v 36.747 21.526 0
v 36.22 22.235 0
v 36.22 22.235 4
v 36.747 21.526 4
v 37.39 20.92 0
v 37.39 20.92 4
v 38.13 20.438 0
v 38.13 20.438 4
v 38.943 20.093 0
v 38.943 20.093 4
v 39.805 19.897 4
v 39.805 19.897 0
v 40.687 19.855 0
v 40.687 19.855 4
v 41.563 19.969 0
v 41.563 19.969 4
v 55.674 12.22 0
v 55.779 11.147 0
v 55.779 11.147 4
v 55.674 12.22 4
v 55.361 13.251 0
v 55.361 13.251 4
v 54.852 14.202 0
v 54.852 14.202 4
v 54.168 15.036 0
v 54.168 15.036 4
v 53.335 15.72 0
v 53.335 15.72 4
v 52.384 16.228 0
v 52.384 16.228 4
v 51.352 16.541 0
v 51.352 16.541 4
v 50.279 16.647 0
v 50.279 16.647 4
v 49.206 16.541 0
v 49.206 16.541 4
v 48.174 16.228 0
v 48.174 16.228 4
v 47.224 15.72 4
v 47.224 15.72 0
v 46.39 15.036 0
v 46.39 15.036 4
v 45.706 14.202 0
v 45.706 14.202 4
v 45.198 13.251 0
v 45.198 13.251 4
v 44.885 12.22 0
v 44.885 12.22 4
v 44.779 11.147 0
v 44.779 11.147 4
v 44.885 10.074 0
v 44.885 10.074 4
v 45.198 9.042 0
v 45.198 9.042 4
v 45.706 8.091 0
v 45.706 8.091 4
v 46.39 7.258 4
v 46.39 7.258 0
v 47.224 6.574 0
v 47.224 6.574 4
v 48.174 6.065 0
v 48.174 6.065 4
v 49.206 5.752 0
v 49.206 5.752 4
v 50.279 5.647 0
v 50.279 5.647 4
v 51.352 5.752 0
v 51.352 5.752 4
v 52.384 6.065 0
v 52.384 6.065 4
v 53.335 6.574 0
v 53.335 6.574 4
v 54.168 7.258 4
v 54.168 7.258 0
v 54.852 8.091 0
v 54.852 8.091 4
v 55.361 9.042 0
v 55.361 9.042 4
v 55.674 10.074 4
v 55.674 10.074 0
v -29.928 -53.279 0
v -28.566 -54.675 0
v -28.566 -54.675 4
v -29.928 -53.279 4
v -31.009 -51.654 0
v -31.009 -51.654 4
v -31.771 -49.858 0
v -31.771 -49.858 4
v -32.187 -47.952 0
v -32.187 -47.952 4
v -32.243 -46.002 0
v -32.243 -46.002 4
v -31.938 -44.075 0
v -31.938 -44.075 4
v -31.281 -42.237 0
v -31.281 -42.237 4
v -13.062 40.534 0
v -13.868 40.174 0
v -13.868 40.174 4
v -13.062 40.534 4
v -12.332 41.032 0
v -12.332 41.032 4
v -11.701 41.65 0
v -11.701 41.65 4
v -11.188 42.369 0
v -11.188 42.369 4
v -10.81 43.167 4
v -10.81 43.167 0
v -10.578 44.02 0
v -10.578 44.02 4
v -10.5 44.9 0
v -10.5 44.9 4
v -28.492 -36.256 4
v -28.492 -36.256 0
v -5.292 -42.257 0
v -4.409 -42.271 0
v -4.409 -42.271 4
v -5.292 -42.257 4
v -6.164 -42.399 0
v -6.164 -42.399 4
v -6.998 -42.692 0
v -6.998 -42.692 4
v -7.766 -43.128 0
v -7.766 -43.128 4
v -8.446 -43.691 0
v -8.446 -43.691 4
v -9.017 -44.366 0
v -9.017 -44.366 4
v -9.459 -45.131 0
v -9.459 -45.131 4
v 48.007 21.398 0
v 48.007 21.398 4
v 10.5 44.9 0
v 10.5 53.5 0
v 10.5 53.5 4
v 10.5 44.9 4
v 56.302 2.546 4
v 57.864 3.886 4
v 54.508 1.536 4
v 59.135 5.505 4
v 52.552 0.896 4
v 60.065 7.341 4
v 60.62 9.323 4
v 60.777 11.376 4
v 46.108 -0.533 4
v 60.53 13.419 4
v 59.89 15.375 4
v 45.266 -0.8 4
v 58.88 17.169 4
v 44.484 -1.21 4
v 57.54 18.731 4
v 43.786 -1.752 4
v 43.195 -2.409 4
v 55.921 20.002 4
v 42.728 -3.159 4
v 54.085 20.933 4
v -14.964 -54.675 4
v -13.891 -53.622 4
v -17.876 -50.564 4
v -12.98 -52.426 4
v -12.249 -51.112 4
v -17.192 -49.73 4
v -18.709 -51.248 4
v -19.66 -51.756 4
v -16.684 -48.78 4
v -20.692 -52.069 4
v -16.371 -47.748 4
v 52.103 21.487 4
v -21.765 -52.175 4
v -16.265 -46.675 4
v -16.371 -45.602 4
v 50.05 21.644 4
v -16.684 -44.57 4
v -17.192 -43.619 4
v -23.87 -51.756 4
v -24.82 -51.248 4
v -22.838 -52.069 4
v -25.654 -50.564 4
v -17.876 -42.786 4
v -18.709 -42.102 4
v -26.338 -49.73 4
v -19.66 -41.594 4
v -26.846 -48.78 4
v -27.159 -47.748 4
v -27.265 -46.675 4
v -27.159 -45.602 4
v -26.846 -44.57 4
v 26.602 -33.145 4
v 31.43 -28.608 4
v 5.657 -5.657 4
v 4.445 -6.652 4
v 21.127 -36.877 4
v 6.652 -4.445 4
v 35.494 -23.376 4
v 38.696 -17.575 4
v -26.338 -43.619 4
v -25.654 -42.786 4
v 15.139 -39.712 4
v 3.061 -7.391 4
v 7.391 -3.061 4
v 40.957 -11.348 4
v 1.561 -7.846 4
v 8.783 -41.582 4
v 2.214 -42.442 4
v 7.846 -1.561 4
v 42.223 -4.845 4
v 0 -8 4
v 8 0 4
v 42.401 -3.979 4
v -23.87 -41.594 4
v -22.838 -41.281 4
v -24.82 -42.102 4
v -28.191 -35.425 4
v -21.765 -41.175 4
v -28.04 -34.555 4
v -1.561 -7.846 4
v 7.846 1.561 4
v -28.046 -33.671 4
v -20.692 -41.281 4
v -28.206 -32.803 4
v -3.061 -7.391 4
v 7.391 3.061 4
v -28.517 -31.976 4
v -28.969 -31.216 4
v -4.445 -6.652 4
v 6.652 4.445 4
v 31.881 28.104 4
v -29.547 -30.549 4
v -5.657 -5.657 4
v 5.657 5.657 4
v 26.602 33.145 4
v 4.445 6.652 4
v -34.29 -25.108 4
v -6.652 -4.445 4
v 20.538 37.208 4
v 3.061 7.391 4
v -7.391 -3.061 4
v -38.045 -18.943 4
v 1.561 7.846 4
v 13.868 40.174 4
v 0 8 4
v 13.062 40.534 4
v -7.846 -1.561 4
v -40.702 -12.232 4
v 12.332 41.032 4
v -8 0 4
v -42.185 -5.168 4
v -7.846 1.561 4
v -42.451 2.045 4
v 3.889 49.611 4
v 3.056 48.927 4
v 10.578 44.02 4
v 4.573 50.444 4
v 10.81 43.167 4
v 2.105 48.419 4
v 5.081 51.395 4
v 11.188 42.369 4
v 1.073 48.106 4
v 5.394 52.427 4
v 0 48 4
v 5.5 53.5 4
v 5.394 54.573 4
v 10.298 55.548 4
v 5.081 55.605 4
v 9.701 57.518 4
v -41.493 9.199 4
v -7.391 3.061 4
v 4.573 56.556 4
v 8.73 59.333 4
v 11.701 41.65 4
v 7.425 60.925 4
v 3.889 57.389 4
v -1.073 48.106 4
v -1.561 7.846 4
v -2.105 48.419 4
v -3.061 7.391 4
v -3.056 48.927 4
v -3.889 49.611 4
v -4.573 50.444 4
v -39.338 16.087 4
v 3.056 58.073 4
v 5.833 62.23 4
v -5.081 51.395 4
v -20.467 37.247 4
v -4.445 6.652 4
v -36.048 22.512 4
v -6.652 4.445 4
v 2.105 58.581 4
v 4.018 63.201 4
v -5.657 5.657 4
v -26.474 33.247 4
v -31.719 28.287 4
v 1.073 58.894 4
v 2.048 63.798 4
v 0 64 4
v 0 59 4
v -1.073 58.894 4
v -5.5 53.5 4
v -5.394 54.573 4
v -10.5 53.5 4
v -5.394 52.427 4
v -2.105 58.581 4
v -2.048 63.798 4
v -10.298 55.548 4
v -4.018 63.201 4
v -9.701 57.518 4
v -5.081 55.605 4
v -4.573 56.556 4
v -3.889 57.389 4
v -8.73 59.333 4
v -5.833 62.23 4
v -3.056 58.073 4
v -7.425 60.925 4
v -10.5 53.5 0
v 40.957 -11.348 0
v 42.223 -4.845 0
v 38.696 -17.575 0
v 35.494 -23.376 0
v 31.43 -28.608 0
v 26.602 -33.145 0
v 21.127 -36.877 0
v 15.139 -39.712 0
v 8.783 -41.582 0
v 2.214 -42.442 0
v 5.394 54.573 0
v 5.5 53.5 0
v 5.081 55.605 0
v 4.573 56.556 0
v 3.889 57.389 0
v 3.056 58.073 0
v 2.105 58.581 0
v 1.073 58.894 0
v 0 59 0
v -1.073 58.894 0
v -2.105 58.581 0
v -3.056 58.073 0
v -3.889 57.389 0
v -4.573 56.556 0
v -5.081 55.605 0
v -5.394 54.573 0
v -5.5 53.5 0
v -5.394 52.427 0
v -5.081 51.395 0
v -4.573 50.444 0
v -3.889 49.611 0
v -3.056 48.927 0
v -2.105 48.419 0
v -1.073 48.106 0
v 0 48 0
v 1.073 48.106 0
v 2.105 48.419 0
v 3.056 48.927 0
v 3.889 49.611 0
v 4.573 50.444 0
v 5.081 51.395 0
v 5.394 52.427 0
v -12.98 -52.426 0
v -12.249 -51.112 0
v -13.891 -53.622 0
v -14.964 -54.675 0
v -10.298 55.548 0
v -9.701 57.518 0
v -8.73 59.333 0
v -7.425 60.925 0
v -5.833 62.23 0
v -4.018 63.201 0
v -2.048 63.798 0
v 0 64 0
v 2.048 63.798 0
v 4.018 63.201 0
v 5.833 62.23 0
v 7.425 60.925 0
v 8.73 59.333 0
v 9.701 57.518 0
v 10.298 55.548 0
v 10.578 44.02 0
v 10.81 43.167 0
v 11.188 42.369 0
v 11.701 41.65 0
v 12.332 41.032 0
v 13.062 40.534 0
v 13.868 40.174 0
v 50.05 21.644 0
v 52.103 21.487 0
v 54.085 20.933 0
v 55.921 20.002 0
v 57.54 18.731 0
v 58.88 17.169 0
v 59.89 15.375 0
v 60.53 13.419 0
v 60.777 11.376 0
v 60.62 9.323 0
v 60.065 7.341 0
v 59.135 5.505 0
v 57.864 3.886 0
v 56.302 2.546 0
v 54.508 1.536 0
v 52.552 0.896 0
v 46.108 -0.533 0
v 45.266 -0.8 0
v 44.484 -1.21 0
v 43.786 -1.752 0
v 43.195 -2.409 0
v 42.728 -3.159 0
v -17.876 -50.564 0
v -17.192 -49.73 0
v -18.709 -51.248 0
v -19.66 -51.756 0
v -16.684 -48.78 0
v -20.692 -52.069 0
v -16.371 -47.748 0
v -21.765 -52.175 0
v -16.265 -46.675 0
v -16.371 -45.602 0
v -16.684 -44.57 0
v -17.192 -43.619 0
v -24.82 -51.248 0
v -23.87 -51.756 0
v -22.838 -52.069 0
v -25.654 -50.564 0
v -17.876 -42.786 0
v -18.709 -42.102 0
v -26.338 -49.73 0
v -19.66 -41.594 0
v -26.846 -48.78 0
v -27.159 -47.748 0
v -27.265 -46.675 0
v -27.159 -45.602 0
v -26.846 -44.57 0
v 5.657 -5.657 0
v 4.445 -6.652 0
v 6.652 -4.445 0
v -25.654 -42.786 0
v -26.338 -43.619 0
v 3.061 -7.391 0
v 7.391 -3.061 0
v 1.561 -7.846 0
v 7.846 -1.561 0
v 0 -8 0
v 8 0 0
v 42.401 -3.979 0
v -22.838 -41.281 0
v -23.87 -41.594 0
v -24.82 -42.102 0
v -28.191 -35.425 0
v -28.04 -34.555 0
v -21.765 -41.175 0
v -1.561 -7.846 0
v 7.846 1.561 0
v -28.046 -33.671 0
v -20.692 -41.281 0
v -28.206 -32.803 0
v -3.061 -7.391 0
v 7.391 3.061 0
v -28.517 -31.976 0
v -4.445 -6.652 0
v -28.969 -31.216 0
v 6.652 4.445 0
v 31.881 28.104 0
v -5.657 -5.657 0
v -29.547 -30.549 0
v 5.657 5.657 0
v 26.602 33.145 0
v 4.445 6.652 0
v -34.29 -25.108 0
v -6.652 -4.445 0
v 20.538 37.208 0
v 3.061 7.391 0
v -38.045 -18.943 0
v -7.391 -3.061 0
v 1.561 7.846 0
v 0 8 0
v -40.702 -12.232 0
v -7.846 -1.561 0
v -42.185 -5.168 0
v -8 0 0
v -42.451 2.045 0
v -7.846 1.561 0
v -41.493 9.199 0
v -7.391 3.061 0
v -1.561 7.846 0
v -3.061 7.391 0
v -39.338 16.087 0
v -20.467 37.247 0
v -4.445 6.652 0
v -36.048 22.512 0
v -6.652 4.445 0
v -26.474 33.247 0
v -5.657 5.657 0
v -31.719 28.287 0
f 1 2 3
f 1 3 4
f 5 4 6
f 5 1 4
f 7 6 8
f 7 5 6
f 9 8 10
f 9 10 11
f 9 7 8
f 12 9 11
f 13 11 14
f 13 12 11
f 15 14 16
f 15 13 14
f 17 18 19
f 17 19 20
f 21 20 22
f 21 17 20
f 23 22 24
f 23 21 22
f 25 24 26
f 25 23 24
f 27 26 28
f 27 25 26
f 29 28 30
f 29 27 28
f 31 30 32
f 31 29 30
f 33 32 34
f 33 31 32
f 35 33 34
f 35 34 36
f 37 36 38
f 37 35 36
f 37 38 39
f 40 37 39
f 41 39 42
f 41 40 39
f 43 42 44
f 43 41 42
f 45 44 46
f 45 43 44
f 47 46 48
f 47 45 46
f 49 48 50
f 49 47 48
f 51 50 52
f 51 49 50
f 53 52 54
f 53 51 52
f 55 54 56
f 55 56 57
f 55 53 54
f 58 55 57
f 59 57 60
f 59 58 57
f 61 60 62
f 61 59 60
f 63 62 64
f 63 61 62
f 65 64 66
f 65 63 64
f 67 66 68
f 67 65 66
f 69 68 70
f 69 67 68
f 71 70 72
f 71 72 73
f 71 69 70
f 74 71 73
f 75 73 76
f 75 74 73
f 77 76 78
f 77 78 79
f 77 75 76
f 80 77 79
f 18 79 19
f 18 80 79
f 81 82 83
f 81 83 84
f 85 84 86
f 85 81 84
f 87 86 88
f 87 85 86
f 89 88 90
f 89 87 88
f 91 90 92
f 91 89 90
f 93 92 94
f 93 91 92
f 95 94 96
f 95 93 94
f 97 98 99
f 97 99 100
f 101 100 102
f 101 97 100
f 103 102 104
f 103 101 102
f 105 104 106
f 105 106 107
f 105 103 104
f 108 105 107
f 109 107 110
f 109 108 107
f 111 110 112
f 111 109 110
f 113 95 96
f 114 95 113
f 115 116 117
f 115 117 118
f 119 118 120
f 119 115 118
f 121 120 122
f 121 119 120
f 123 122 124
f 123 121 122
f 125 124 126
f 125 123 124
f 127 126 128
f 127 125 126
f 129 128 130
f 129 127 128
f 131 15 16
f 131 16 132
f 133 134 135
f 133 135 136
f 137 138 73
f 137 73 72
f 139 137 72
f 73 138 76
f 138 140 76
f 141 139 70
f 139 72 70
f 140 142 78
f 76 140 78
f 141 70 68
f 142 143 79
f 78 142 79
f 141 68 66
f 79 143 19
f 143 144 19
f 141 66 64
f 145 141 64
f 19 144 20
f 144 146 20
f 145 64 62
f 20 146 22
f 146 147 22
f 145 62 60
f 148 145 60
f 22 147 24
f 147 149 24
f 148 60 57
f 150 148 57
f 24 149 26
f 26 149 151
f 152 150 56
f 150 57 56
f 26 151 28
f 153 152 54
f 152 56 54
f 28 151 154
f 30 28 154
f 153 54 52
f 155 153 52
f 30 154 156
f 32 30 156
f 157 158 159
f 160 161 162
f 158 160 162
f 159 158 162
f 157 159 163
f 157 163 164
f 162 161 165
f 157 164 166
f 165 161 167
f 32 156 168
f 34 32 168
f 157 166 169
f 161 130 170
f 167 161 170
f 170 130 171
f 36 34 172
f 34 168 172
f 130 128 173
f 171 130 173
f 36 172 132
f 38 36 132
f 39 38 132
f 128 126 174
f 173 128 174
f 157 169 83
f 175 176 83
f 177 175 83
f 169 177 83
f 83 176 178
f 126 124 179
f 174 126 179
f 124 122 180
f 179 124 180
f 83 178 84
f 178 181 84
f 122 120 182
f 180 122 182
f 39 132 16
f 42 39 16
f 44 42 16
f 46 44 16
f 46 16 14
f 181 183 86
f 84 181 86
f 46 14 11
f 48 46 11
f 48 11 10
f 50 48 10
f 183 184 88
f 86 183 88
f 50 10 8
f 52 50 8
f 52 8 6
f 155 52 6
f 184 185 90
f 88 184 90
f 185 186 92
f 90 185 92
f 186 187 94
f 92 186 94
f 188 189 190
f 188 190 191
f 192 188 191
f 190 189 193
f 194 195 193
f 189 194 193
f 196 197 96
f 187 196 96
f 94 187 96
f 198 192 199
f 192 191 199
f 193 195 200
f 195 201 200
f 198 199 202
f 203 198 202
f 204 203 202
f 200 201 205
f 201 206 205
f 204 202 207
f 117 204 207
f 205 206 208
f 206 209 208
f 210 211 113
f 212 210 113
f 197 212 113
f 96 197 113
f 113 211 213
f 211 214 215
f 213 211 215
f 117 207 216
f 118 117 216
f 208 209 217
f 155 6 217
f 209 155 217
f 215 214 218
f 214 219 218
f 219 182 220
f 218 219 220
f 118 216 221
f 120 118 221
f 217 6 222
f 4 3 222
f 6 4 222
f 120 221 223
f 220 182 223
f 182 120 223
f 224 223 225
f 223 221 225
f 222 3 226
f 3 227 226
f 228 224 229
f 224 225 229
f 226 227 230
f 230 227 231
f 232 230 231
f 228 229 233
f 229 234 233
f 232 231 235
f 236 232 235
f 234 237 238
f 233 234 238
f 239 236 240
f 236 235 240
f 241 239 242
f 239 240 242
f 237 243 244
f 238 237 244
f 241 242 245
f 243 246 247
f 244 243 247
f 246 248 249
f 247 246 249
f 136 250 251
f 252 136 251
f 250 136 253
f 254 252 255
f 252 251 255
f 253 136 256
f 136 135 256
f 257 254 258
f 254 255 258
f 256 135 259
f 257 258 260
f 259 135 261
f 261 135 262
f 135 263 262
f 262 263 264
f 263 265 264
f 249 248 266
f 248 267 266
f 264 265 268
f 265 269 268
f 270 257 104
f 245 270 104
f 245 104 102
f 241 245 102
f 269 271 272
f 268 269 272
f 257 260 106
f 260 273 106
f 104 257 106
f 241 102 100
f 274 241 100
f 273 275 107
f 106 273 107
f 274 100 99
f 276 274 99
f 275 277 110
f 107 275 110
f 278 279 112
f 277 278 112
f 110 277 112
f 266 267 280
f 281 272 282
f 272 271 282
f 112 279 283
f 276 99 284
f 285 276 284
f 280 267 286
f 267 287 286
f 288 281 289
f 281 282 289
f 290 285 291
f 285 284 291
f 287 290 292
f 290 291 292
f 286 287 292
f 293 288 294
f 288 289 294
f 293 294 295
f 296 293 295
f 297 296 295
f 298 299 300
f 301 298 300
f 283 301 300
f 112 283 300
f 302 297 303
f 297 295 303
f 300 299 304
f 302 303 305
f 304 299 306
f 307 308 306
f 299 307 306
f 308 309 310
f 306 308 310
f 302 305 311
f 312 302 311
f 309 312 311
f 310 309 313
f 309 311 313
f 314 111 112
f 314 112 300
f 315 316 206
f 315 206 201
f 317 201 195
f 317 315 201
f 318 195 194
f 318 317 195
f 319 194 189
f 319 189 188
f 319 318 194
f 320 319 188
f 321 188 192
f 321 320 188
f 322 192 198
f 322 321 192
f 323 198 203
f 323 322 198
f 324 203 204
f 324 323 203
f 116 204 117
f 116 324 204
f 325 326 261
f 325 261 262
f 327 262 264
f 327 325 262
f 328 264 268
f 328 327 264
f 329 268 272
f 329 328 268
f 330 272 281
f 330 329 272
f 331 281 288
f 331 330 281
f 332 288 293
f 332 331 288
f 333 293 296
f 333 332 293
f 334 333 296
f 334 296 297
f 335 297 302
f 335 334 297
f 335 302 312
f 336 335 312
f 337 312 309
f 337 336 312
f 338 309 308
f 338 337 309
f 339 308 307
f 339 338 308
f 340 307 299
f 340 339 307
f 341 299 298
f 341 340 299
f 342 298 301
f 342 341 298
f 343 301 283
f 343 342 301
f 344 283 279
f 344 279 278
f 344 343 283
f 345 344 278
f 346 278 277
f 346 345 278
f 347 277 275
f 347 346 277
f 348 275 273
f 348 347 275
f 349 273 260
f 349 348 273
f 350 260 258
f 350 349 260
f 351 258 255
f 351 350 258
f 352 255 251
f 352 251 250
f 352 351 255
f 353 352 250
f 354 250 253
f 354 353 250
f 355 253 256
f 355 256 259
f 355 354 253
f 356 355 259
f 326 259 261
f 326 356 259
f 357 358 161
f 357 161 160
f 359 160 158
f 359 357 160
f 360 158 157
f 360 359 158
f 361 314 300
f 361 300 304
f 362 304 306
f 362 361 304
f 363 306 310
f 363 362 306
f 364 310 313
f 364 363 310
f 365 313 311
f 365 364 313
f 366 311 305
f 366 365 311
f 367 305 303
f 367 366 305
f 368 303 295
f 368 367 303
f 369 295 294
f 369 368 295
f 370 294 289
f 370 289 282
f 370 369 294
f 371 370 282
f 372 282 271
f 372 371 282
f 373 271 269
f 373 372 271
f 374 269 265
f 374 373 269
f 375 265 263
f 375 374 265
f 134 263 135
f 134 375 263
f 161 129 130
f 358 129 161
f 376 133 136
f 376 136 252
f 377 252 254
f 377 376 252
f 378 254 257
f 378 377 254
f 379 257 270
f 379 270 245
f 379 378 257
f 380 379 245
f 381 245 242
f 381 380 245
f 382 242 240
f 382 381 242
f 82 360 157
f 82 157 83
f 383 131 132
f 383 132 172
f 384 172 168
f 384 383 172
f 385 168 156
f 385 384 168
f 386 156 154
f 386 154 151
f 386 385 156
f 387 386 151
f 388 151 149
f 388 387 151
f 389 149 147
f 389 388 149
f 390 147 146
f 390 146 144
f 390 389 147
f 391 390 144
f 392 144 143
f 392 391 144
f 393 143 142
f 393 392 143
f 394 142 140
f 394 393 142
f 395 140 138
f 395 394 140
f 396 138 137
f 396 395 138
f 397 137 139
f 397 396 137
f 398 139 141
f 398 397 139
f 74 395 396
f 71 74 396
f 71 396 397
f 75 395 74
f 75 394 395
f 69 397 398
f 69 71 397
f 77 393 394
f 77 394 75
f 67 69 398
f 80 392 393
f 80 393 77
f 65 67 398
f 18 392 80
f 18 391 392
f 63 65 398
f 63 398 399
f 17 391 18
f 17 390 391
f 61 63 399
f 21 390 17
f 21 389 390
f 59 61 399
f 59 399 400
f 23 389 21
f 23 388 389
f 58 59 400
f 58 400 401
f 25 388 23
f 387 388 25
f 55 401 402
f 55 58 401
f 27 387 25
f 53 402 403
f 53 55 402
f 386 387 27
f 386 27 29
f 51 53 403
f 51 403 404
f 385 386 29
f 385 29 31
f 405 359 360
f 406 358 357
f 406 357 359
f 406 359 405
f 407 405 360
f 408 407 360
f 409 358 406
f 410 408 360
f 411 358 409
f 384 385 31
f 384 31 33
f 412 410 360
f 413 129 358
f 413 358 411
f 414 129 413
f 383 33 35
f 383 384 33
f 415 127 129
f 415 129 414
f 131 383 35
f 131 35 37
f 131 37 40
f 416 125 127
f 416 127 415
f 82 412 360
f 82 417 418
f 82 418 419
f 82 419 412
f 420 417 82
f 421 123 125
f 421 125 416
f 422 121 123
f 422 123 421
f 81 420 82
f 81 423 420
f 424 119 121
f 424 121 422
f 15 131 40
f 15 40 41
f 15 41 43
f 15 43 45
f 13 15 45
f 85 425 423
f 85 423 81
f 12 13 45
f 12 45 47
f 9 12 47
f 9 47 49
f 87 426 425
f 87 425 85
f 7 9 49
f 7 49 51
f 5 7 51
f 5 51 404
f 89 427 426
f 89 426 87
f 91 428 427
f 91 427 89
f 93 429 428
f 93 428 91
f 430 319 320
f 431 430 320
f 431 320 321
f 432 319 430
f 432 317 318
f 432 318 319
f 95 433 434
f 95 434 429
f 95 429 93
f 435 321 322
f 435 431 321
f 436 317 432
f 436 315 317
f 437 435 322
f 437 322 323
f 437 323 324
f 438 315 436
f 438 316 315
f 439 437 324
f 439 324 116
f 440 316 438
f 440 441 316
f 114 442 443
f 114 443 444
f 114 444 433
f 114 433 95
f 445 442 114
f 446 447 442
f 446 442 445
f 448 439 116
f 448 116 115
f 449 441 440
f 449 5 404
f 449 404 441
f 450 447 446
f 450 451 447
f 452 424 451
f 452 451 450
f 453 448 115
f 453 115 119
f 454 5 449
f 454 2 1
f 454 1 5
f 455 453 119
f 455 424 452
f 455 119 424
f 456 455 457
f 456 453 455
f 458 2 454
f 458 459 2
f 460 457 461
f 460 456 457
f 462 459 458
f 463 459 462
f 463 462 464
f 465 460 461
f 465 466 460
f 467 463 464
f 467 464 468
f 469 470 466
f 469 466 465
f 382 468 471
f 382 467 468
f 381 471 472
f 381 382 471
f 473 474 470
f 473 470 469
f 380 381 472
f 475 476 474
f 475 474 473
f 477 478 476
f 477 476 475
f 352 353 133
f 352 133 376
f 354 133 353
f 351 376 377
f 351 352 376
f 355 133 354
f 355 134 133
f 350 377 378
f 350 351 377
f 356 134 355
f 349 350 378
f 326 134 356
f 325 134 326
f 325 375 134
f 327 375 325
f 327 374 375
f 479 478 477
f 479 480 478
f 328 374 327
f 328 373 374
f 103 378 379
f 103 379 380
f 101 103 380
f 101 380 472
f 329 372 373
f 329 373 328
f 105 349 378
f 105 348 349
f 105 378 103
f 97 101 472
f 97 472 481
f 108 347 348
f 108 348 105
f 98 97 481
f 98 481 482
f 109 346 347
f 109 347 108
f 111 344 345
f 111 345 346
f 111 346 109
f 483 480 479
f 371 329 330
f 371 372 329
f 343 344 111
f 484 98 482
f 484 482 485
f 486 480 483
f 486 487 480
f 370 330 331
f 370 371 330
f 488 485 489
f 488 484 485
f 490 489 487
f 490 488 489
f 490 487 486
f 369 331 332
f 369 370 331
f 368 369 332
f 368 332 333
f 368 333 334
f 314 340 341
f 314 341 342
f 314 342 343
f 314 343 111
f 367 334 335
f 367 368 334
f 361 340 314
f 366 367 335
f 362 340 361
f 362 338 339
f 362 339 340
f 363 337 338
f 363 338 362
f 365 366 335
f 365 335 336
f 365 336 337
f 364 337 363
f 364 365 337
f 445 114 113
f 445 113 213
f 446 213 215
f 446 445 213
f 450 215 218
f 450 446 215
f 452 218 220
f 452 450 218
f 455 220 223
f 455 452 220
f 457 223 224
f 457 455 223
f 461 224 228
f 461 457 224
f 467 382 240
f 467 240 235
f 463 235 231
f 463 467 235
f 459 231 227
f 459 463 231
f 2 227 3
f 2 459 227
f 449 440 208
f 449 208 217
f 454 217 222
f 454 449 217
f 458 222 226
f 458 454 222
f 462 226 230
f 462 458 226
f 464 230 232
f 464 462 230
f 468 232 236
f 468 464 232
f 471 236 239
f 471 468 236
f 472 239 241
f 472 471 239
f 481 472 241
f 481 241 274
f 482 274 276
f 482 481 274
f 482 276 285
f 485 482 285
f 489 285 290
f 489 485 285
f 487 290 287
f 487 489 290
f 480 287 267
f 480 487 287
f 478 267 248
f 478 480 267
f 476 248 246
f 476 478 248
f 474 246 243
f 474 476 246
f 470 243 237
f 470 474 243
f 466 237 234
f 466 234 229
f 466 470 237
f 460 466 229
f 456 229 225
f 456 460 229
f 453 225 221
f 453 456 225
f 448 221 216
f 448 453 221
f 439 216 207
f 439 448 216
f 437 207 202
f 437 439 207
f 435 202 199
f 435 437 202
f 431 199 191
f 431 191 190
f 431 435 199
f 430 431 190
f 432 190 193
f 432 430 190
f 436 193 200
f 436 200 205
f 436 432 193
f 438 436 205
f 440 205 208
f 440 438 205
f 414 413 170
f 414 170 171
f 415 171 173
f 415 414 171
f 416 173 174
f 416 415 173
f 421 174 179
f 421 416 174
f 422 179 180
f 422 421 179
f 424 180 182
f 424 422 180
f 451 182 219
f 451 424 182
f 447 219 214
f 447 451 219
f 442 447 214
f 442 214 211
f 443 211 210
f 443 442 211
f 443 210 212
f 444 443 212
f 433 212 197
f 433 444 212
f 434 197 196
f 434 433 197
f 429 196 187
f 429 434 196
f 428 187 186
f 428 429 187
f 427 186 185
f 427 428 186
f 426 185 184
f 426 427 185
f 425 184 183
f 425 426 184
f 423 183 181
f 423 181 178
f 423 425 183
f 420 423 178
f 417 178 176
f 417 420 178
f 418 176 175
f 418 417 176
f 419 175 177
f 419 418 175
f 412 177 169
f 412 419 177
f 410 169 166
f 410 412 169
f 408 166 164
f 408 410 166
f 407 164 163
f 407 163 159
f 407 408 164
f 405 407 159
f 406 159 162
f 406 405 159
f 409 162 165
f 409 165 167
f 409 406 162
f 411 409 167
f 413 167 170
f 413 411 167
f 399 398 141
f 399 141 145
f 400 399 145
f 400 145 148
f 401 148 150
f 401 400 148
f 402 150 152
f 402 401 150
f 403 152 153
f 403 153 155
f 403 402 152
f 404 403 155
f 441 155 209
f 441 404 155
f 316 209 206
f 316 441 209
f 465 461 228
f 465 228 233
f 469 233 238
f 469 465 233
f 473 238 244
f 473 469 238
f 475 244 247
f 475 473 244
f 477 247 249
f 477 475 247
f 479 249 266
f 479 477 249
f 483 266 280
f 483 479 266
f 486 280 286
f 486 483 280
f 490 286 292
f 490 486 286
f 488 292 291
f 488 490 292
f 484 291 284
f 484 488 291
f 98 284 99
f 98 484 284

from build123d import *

# Parameters (mm, degrees)
SKETCH1_R           = 5.5
SKETCH1_R_2         = 8
BOSS_EXTRUDE1_DEPTH = 4


with BuildPart() as part:
    # Sketch1 → Boss-Extrude1 (new body)
    with BuildSketch(Plane.XY):
        with BuildLine():
            Line((-31.281072244, -42.237359284), (-28.491744654, -36.255626964))
            ThreePointArc((-28.491744654, -36.255626964), (-28.106649146, -33.233302048), (-29.547148474, -30.548584534))
            ThreePointArc((-29.547148474, -30.548584534), (-41.492580303, 9.198683592), (-13.868421053, 40.173584574))
            ThreePointArc((-13.868421053, 40.173584574), (-11.428274645, 41.997983641), (-10.5, 44.899888641))
            Line((-10.5, 44.899888641), (-10.5, 53.5))
            ThreePointArc((-10.5, 53.5), (0, 64), (10.5, 53.5))
            Line((10.5, 53.5), (10.5, 44.899888641))
            ThreePointArc((10.5, 44.899888641), (11.428274645, 41.997983641), (13.868421053, 40.173584574))
            ThreePointArc((13.868421053, 40.173584574), (26.601747568, 33.145090531), (36.219634513, 22.234839234))
            ThreePointArc((36.219634513, 22.234839234), (38.528932384, 20.247406269), (41.562966054, 19.969222638))
            Line((41.562966054, 19.969222638), (48.00662842, 21.397748193))
            ThreePointArc((48.00662842, 21.397748193), (60.530352441, 13.419256064), (52.551860313, 0.895532043))
            Line((52.551860313, 0.895532043), (46.108197947, -0.532993511))
            ThreePointArc((46.108197947, -0.532993511), (43.475995088, -2.067351539), (42.22298591, -4.844528963))
            ThreePointArc((42.22298591, -4.844528963), (26.601747568, -33.145090531), (-4.409032487, -42.270680531))
            ThreePointArc((-4.409032487, -42.270680531), (-7.39158054, -42.892897179), (-9.459281126, -45.130610461))
            Line((-9.459281126, -45.130610461), (-12.248608716, -51.112342781))
            ThreePointArc((-12.248608716, -51.112342781), (-13.414168685, -53.040091057), (-14.964105225, -54.674851032))
            Line((-14.964105225, -54.674851032), (-28.565575734, -54.674851032))
            ThreePointArc((-28.565575734, -54.674851032), (-32.023186029, -48.914571235), (-31.281072244, -42.237359284))
        make_face()
        with Locations((50.279244367, 11.146640118)):
            Circle(SKETCH1_R, mode=Mode.SUBTRACT)
        with Locations((0, 53.5)):
            Circle(SKETCH1_R, mode=Mode.SUBTRACT)
        with Locations((-21.76484048, -46.674851032)):
            Circle(SKETCH1_R, mode=Mode.SUBTRACT)
        Circle(SKETCH1_R_2, mode=Mode.SUBTRACT)
    extrude(amount=BOSS_EXTRUDE1_DEPTH)


solid = part.part
